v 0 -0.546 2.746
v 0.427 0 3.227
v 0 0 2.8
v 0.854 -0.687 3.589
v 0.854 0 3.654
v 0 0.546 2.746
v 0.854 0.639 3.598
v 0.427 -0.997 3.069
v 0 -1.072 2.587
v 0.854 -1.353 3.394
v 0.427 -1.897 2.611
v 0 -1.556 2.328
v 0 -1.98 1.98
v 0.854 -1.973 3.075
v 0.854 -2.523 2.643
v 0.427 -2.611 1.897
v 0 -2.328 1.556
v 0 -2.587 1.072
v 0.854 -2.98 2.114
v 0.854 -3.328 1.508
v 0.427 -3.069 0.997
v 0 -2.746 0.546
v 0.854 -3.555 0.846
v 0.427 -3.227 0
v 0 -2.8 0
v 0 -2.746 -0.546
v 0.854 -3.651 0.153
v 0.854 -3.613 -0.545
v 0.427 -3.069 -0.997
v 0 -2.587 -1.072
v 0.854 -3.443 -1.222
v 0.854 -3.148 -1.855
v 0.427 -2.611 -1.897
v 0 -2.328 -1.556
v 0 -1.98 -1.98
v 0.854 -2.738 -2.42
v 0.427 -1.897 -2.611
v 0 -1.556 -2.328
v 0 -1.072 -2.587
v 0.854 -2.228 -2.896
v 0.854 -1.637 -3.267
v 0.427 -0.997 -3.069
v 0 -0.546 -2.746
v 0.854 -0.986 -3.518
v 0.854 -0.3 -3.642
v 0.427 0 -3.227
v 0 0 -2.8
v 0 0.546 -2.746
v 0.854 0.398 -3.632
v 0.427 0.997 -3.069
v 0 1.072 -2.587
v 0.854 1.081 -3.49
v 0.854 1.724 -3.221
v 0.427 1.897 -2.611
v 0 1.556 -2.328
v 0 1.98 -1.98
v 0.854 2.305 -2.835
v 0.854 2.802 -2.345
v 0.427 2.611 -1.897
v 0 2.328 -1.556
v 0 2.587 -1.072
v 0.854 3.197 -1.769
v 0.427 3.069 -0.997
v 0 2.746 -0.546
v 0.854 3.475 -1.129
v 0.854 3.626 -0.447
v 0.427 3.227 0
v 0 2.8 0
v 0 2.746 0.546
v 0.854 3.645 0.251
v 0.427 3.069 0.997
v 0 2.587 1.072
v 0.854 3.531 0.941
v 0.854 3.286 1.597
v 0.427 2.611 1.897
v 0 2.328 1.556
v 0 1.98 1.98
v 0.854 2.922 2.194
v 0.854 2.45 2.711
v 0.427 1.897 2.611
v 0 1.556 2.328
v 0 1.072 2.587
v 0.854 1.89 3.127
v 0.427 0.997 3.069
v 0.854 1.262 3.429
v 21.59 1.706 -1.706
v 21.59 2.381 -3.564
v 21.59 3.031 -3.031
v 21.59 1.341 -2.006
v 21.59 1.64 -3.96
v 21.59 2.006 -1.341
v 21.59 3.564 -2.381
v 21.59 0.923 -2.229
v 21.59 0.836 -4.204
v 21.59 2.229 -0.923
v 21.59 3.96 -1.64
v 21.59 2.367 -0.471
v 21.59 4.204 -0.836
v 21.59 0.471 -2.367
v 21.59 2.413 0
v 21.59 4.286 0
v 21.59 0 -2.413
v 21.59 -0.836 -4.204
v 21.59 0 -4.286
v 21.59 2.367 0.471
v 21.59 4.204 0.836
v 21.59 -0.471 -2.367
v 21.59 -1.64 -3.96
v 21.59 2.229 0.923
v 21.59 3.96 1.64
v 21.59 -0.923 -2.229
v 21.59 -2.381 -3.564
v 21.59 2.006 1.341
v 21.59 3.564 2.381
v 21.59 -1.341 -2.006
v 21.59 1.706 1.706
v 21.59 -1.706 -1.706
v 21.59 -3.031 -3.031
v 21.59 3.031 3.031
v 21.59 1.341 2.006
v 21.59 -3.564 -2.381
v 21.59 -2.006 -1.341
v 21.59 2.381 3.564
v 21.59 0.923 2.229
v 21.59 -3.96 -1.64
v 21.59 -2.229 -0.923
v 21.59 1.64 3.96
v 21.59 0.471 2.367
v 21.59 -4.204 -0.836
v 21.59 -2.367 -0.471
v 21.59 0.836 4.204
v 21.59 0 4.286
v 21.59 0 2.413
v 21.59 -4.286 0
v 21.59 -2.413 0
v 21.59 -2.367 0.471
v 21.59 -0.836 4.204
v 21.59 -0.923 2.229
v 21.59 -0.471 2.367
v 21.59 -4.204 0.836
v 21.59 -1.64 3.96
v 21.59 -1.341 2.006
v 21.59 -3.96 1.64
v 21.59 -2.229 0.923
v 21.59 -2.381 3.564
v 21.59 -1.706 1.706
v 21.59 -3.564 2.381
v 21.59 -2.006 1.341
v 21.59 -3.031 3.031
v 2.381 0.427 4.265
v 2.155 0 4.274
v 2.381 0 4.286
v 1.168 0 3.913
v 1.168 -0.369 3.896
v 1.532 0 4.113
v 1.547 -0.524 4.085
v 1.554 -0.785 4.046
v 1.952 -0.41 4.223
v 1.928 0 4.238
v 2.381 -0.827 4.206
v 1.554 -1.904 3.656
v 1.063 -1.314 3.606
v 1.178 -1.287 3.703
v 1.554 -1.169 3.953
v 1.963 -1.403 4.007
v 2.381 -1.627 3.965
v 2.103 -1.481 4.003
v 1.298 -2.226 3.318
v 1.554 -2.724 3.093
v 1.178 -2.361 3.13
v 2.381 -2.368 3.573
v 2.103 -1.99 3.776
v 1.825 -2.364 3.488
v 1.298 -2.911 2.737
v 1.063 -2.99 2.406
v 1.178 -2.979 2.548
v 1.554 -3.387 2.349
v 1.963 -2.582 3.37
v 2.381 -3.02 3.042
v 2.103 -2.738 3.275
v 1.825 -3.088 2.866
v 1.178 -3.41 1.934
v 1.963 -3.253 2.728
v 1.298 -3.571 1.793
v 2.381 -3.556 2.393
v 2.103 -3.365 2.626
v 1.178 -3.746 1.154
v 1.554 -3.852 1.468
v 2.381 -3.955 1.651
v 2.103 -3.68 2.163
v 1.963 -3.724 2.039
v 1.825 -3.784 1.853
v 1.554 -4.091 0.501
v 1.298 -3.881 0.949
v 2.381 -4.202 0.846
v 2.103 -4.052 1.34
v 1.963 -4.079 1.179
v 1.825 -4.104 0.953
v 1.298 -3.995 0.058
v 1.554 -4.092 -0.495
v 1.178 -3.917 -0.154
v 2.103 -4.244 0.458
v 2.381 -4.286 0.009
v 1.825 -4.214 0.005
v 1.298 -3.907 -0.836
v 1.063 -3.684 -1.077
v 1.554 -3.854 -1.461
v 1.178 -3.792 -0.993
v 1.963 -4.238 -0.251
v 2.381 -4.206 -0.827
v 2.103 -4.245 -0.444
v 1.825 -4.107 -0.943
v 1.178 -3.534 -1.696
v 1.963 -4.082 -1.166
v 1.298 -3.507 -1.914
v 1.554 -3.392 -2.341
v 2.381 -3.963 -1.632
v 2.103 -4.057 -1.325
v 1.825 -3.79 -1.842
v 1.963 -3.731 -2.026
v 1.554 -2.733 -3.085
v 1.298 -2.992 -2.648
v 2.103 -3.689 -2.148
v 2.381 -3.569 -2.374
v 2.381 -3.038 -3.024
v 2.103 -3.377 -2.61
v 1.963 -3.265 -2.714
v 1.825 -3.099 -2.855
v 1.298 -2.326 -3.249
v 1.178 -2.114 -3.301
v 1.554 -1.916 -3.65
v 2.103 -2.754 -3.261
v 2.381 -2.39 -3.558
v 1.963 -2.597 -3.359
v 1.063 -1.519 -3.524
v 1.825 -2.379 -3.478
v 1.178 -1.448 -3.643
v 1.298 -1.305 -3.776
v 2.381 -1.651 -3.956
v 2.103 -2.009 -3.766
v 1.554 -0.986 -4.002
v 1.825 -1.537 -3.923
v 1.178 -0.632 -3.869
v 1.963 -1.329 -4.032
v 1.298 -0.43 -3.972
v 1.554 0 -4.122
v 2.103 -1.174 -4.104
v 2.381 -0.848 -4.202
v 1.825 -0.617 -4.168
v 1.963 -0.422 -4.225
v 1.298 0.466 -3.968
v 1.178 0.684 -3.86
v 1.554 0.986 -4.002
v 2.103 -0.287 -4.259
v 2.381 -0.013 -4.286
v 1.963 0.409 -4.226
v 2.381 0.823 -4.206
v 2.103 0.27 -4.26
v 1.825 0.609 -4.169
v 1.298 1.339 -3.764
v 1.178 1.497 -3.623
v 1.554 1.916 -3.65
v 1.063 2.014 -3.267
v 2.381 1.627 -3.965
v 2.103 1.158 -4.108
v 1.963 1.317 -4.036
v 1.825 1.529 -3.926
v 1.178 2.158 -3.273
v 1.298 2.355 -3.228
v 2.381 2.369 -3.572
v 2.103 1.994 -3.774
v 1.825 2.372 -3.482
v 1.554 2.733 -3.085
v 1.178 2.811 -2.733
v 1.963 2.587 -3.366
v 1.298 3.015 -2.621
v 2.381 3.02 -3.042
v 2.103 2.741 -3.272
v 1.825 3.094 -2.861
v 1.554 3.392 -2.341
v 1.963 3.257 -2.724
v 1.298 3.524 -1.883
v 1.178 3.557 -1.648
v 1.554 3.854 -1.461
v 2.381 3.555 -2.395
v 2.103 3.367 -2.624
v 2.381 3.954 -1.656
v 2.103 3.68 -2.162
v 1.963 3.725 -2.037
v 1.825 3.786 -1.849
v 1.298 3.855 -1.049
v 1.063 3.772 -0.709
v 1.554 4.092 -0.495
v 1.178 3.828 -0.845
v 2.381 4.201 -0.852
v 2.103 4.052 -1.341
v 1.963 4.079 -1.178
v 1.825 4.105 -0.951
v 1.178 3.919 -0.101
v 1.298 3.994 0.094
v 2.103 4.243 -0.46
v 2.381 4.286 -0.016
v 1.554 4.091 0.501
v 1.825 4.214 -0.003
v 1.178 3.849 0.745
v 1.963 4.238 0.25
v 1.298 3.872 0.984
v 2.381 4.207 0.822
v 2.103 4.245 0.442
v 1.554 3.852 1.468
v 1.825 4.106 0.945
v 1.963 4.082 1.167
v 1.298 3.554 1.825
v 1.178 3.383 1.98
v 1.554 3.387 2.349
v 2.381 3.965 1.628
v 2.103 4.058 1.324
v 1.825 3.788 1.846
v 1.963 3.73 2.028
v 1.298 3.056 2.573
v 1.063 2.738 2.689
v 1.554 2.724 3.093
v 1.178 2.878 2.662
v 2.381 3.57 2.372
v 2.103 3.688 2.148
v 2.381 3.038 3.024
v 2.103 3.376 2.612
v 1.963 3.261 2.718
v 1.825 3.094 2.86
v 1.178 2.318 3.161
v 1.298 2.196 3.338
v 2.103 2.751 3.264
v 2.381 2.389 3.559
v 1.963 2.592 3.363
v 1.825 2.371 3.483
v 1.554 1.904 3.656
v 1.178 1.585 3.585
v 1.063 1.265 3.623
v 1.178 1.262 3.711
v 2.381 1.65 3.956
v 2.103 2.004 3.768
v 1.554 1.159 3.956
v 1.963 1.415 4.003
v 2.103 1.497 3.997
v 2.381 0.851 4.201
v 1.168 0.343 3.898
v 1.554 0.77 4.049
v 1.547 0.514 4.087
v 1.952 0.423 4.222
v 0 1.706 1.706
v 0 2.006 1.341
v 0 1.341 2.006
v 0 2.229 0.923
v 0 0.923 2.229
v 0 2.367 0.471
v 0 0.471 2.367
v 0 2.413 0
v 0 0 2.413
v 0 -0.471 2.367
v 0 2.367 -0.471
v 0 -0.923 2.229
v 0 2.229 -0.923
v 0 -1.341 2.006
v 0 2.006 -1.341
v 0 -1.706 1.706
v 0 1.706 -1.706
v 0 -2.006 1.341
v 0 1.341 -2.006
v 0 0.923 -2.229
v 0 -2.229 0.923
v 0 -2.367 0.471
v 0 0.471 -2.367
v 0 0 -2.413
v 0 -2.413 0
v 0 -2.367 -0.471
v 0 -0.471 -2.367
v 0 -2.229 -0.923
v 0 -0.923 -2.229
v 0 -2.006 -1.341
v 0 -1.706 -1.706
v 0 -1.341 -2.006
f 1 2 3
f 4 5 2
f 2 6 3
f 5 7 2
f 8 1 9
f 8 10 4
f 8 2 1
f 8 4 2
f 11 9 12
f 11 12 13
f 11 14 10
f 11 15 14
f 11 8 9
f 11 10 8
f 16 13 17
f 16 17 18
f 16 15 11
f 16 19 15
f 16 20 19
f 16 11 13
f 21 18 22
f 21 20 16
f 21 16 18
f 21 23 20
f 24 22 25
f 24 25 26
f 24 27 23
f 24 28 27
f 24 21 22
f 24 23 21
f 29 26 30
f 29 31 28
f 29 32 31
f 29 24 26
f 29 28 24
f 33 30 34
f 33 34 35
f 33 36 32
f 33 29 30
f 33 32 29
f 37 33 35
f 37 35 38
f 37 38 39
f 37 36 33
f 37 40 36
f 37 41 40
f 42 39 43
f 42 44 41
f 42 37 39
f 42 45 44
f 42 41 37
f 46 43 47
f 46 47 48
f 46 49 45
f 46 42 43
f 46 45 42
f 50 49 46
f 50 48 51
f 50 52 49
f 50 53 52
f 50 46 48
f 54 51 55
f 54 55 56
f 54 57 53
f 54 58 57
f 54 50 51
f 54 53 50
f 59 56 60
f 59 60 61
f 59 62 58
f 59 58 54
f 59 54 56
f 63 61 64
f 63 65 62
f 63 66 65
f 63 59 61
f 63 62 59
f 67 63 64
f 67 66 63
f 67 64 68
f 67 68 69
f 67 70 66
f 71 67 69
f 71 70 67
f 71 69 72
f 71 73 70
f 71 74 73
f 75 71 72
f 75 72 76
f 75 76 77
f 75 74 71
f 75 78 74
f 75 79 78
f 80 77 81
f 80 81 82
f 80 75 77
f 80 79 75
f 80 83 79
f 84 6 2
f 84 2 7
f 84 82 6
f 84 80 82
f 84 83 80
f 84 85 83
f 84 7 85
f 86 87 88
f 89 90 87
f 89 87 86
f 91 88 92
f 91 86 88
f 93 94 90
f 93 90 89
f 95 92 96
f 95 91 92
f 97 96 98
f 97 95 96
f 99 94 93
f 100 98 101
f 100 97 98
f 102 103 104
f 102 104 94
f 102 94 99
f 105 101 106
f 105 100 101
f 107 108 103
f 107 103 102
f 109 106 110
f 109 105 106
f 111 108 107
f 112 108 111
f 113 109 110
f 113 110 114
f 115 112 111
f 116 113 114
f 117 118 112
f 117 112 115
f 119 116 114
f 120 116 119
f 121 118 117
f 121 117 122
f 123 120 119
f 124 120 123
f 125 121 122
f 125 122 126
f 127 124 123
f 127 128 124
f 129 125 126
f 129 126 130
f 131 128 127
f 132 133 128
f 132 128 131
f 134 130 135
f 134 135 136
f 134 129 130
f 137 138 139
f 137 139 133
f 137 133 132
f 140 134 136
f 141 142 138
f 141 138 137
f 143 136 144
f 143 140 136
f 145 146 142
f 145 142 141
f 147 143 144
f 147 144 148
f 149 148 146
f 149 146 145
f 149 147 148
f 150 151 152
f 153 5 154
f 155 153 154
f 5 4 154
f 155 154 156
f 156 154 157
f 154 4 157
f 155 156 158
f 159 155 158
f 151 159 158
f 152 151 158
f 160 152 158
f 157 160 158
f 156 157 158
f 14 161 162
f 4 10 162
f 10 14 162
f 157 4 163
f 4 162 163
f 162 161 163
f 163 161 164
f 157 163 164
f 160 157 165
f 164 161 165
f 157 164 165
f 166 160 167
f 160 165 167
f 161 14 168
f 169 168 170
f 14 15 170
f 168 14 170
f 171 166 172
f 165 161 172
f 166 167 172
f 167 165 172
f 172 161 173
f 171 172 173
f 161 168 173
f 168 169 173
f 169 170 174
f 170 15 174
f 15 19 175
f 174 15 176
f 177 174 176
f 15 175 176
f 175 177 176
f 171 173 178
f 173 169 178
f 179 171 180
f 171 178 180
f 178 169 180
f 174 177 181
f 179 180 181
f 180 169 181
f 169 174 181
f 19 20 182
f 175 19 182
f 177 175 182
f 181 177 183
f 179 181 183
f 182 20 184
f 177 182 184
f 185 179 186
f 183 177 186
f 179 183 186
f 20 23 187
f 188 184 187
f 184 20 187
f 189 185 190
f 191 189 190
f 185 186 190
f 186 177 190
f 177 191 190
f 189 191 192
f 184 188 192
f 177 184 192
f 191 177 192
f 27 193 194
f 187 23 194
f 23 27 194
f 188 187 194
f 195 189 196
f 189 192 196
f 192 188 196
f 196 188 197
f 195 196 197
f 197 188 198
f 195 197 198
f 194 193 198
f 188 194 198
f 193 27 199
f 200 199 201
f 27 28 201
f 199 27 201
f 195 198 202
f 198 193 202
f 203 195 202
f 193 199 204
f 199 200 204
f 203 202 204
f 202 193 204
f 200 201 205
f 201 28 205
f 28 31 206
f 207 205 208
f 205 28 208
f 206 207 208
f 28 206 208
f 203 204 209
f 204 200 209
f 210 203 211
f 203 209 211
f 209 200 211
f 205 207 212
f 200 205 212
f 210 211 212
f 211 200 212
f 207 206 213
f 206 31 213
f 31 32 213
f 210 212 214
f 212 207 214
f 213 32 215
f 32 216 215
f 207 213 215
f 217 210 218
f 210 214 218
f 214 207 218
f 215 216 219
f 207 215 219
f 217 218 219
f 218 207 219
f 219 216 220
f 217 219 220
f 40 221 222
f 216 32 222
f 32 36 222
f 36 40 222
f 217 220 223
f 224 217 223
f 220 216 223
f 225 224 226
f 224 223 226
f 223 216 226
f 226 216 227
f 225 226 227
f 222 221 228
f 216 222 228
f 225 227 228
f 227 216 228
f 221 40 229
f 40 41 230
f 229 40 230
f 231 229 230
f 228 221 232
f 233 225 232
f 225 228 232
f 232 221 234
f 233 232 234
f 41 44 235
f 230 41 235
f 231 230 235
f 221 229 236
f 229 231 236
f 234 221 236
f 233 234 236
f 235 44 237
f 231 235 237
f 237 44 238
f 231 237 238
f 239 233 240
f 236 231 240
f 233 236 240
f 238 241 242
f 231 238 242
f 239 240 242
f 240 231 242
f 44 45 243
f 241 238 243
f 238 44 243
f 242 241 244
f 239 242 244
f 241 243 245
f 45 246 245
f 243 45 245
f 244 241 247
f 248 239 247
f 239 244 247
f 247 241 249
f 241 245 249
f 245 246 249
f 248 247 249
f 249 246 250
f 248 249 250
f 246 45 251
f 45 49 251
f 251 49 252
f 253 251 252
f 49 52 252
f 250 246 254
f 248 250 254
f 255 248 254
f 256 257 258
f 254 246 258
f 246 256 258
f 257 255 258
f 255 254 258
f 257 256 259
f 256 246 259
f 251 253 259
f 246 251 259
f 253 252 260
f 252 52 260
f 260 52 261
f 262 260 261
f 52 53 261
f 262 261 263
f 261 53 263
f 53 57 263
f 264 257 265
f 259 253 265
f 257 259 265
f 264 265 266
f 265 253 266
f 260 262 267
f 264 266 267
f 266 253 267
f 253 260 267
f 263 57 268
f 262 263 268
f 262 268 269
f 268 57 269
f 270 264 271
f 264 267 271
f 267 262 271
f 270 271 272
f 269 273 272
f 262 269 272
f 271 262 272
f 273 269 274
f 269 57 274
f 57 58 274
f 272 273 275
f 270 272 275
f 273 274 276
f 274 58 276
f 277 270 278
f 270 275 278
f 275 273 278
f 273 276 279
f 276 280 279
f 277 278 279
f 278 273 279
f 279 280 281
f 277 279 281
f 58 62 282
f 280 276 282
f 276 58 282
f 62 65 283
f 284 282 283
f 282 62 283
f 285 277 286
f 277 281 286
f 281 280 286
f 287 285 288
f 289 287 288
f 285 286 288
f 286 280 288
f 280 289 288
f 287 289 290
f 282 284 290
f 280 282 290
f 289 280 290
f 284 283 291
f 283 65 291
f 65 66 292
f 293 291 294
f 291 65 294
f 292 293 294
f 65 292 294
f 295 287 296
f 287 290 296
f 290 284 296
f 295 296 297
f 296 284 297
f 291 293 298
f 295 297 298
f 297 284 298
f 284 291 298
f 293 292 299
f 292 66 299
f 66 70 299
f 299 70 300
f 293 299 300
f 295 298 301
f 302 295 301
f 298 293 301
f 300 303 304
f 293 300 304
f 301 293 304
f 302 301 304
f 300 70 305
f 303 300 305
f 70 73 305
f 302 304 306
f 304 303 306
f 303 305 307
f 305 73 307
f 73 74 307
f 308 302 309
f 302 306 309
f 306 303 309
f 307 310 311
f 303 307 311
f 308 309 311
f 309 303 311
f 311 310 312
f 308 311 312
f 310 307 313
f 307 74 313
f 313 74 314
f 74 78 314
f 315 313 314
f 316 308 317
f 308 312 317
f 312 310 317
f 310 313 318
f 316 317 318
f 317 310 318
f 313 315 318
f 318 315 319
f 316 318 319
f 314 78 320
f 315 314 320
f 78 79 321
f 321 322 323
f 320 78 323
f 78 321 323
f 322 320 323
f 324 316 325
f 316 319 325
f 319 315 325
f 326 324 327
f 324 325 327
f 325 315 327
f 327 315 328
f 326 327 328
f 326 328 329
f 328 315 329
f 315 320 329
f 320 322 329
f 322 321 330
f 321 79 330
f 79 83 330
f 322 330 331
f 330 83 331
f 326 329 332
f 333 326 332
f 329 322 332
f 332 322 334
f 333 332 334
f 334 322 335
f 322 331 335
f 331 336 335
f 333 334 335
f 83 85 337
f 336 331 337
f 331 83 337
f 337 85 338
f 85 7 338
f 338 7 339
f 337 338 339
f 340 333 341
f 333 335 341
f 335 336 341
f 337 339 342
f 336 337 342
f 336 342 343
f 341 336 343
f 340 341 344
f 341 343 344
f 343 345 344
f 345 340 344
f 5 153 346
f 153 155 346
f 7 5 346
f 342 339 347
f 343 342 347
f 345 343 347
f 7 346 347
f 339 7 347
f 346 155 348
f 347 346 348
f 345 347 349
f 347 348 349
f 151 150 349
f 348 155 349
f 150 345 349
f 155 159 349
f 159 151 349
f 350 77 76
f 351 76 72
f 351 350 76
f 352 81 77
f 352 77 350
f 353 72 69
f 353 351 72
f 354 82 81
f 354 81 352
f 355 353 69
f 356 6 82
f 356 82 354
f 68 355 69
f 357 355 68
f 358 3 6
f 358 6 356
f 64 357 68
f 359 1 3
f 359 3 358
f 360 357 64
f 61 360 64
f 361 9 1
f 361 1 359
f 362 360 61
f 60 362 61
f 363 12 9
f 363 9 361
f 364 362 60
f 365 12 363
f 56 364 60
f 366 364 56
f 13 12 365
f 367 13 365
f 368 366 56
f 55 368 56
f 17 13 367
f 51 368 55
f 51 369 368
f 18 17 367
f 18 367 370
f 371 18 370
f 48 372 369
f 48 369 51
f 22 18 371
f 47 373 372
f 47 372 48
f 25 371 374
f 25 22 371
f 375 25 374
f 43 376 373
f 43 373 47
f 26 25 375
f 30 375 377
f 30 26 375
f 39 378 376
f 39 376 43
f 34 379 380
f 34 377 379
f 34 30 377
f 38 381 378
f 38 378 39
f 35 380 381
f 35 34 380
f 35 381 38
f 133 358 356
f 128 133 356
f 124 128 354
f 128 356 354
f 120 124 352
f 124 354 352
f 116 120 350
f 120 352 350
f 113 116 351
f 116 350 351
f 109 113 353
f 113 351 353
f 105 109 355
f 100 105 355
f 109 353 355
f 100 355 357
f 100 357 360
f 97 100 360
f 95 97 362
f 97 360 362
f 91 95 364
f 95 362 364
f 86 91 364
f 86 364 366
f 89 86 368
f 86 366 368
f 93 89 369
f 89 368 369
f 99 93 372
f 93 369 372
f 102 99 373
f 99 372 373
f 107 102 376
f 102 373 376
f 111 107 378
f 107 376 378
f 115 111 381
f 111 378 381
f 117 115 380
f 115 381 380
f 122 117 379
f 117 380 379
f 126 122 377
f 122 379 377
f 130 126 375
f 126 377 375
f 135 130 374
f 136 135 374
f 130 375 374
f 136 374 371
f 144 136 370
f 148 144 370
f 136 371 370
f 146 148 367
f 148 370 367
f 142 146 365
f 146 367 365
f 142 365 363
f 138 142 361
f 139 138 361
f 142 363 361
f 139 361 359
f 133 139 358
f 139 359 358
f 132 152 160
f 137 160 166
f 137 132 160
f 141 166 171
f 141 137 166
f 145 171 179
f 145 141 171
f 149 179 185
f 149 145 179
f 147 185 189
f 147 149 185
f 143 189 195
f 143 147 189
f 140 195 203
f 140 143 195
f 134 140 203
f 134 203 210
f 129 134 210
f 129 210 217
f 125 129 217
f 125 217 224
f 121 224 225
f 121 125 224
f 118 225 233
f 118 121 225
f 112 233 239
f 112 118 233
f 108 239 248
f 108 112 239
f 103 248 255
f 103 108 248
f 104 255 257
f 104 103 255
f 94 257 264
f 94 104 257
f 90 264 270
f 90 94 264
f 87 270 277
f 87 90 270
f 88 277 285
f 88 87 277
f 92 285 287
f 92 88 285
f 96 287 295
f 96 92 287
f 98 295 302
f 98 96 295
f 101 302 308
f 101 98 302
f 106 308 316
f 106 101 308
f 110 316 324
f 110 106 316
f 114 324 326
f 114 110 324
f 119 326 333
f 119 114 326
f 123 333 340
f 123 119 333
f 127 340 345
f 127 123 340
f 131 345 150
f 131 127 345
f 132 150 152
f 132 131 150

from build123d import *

# Parameters (mm, degrees)
FILLET1_R          = 2.159
SKETCH3_R          = 2.413
CUT_EXTRUDE1_DEPTH = 21.59


with BuildPart() as part:
    # Sketch1 → Revolve1 (revolve)
    with BuildSketch(Plane.XY, mode=Mode.PRIVATE) as revolve1_sk:
        Polygon((0, 0), (0, 2.8), (1.48625, 4.28625), (21.59, 4.28625), (21.59, 0), align=None)
    revolve(revolve1_sk.sketch.rotate(Axis((0, 0, 0), (1, 0, 0)), 90), axis=Axis((0, 0, 0), (1, 0, 0)))

    # Fillet1
    fillet1_edges = [part.edges().sort_by_distance(p)[0] for p in [
        (1.48625, 0, -4.28625),
    ]]
    fillet(fillet1_edges, radius=FILLET1_R)

    # Sketch3 → Cut-Extrude1 (cut)
    with BuildSketch(Plane.ZY):
        Circle(SKETCH3_R)
    extrude(amount=-CUT_EXTRUDE1_DEPTH, mode=Mode.SUBTRACT)


solid = part.part
